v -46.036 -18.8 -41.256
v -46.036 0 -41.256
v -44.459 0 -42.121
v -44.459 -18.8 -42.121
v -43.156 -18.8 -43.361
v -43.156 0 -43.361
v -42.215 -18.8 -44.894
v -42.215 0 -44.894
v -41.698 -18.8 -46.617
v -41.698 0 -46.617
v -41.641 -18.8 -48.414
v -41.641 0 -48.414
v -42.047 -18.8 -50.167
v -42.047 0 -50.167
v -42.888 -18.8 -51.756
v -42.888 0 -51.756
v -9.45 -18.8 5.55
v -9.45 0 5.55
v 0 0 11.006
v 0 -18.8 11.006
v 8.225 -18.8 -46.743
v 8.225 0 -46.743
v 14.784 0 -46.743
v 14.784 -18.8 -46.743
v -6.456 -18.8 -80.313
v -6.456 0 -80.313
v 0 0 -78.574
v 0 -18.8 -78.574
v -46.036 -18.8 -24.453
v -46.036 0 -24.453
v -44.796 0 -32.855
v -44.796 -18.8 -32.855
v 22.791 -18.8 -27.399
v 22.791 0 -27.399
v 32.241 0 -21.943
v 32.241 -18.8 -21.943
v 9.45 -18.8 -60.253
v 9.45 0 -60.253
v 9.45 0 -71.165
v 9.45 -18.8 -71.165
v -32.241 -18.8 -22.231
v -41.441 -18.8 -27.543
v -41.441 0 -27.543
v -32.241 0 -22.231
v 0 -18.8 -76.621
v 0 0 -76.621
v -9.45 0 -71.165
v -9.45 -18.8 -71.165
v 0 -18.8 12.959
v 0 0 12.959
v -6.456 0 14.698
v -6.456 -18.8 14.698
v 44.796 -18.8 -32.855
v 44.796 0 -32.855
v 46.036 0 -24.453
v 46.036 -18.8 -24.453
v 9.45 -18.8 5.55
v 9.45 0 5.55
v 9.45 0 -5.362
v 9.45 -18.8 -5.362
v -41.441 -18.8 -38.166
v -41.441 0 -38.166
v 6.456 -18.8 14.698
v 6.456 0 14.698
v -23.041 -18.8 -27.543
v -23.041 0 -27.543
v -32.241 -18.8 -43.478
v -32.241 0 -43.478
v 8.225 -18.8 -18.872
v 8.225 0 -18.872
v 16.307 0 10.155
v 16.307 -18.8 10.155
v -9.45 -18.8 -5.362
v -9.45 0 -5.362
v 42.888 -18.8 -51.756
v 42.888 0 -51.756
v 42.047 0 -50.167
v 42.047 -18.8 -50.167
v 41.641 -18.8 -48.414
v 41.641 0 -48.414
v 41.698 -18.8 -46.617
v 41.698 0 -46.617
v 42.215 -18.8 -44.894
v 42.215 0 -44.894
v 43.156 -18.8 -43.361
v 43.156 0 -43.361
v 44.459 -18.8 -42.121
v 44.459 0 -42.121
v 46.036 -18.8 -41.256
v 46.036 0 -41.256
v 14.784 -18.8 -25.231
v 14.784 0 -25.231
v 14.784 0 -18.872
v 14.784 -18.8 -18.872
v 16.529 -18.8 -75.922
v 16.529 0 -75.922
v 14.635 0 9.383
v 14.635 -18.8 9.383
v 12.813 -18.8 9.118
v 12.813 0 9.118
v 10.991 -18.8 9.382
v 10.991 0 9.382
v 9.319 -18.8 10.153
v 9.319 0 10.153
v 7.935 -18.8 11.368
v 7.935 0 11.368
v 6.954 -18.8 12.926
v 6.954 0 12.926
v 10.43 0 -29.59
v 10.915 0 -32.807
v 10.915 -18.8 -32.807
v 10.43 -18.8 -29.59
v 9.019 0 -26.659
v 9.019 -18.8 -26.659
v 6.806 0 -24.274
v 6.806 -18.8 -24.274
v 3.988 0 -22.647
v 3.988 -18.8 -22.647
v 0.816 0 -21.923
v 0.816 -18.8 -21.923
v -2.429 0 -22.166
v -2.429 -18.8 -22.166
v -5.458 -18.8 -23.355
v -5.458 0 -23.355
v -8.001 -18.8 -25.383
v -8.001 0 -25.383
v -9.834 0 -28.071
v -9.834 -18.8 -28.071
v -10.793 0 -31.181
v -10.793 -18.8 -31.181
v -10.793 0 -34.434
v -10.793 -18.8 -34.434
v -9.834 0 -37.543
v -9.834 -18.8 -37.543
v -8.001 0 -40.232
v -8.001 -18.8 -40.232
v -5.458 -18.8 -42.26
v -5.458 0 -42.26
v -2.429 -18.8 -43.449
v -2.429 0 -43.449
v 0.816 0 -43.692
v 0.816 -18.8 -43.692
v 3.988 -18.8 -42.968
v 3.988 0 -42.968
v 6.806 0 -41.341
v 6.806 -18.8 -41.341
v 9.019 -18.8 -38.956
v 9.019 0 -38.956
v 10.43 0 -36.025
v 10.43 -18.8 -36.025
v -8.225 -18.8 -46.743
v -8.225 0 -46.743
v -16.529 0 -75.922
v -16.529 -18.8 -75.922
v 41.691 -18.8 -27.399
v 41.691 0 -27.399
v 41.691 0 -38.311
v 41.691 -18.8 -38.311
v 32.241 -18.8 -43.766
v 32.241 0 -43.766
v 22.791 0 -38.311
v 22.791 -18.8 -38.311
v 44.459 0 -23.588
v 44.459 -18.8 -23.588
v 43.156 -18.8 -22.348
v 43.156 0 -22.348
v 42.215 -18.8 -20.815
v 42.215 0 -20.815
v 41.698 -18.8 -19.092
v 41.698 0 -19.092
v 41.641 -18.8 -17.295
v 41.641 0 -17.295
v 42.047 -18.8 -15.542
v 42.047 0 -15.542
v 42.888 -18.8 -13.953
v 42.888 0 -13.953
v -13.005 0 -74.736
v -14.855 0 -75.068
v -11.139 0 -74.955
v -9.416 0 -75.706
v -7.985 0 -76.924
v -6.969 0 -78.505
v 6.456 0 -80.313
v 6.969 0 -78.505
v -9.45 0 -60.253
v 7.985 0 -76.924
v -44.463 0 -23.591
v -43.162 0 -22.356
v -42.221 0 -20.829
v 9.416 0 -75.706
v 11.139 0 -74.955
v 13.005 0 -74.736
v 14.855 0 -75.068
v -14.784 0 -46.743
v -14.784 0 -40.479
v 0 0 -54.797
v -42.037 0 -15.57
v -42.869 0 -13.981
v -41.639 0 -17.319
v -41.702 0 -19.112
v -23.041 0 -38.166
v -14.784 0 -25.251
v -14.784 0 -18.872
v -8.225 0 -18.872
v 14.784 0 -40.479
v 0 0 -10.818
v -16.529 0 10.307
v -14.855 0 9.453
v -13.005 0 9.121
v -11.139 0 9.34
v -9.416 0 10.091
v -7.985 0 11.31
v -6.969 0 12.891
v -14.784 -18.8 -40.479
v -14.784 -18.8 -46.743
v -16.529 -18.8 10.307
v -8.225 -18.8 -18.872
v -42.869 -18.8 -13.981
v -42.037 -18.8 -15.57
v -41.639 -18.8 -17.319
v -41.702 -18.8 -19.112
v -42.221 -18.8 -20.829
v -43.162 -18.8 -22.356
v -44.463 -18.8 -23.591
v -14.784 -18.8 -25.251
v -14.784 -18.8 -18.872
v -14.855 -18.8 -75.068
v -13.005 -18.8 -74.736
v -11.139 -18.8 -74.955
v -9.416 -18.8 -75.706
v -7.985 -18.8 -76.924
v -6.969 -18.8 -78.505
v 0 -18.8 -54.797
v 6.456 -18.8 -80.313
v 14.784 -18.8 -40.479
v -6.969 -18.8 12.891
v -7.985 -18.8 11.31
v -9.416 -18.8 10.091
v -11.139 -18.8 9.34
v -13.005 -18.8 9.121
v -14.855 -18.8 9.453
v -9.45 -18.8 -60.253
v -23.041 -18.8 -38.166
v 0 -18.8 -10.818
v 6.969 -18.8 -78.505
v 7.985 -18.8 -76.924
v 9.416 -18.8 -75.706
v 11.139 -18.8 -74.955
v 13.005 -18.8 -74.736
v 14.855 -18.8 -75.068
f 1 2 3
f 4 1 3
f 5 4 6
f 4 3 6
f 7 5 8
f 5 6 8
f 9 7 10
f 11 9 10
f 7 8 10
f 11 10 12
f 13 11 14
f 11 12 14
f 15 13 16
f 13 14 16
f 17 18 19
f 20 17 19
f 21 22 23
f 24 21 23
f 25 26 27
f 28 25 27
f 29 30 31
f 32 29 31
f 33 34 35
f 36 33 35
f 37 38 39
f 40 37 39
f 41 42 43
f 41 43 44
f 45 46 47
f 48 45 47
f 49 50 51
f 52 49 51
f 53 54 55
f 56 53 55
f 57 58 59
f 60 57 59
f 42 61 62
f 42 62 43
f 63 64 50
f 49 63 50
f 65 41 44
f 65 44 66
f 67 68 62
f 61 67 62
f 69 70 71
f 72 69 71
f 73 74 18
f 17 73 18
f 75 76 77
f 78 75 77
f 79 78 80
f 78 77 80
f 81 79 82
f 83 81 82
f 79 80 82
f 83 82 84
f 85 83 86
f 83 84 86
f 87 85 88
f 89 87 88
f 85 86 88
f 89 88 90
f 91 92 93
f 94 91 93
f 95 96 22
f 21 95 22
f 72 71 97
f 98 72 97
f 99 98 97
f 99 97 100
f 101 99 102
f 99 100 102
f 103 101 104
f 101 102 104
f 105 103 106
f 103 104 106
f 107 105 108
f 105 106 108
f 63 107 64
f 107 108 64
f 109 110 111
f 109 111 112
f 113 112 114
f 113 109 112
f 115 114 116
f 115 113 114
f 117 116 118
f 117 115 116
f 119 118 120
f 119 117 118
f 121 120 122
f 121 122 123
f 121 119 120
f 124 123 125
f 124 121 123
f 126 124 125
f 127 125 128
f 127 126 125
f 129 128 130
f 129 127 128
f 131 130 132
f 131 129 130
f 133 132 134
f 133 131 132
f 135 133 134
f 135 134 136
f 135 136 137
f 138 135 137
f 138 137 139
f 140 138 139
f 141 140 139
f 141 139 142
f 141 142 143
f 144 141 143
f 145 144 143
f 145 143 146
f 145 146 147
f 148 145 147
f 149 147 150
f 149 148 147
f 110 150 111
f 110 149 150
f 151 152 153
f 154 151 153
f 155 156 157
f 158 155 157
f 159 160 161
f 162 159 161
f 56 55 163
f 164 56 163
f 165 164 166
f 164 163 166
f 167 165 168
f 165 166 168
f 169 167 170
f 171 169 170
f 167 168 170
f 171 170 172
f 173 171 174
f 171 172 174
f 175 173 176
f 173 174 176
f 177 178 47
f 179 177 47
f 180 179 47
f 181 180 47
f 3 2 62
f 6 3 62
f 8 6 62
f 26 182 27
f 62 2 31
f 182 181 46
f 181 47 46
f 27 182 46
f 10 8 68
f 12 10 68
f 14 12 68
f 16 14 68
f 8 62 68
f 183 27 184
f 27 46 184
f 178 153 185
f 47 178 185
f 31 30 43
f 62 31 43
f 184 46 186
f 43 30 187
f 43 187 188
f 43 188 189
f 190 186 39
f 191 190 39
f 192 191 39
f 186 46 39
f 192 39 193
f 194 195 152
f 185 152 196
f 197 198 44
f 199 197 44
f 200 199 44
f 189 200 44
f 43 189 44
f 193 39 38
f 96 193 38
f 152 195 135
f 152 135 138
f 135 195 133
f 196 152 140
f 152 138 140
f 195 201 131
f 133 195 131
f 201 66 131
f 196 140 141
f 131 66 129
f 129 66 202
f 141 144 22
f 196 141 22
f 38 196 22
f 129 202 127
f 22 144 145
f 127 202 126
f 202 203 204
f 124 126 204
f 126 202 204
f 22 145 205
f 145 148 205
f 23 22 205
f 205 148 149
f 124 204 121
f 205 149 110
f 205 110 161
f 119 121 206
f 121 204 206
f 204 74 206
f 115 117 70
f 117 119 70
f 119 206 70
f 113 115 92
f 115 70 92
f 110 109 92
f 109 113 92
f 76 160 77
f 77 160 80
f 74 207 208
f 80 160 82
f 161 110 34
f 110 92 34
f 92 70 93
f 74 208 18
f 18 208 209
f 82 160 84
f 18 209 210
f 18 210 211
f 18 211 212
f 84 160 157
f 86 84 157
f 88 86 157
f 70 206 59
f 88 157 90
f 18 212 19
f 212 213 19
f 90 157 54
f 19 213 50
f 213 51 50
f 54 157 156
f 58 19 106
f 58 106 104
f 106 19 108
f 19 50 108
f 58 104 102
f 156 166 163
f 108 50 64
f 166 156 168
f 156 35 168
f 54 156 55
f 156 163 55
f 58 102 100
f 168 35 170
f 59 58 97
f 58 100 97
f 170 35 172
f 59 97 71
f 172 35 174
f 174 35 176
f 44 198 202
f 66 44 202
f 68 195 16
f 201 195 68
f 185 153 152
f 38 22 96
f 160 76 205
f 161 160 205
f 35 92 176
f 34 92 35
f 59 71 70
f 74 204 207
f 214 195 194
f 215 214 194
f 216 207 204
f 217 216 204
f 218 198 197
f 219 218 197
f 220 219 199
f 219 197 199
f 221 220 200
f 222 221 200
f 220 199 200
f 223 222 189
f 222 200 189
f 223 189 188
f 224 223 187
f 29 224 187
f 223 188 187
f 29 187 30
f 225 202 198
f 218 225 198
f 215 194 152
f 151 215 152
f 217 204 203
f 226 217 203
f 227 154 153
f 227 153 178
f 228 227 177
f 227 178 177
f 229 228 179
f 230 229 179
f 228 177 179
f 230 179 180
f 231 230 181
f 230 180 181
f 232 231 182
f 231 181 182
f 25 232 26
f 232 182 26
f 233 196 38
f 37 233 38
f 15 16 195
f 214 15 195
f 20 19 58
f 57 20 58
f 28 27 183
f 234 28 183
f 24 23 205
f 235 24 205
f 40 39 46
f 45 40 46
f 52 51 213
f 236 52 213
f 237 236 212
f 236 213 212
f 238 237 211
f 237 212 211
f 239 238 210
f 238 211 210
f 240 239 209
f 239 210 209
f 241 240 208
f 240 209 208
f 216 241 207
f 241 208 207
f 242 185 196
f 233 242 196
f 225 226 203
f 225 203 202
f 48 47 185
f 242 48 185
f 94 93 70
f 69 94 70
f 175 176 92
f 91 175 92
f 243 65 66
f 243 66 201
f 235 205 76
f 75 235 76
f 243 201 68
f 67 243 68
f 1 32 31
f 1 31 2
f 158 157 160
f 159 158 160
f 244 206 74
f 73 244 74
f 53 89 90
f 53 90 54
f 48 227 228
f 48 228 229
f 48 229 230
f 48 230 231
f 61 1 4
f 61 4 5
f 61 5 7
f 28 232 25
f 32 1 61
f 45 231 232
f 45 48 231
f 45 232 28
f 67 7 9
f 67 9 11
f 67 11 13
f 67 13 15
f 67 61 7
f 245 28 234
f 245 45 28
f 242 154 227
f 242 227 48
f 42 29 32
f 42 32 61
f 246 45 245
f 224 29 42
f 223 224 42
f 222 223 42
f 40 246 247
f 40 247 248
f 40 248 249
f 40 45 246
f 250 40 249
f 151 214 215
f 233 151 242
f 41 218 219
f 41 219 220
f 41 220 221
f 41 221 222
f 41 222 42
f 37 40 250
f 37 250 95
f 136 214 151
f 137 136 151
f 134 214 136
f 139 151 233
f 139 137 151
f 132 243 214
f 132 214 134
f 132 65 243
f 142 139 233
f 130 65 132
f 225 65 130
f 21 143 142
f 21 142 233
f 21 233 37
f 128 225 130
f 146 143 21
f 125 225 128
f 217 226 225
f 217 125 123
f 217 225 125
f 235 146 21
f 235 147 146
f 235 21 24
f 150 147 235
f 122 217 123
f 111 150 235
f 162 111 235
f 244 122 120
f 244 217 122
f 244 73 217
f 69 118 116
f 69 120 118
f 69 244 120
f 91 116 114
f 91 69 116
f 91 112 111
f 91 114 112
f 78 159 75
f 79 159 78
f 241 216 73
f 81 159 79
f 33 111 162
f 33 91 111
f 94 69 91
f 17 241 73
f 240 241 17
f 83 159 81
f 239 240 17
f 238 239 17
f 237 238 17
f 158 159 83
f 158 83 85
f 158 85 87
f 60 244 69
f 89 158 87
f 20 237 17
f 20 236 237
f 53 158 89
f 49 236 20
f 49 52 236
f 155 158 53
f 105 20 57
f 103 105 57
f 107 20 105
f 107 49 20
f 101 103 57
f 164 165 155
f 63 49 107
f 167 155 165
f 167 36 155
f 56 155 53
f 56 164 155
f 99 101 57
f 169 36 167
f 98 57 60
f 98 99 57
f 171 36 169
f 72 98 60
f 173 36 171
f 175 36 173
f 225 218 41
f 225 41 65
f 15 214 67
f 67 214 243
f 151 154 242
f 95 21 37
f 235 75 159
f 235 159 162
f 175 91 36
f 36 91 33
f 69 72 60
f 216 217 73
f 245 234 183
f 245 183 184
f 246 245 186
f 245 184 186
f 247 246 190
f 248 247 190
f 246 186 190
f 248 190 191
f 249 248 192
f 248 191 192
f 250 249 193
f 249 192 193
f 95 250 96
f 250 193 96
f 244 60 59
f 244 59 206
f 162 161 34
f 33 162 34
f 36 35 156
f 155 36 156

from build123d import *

# Parameters (mm, degrees)
F0_R     = 10.915306
F1_DEPTH = 18.8


with BuildPart() as f1:
    # F0 (on Front) → F1 (new body)
    with BuildSketch(Plane.XZ):
        Polygon((-8.224501, -18.871788), (-14.783561, -18.871788), (-14.783561, -25.250662), (-14.783561, -40.478557), (-14.783561, -46.743103), (-8.224501, -46.743103), (8.224501, -46.743103), (14.783561, -46.743103), (14.783561, -40.478557), (14.783561, -25.230598), (14.783561, -18.871788), (8.224771, -18.871788), align=None)
        with Locations((0, -32.807445)):
            Circle(F0_R, mode=Mode.SUBTRACT)
        with BuildLine():
            Line((-16.529163, 10.306755), (-8.224501, -18.871788))
            Line((-8.224501, -18.871788), (8.224771, -18.871788))
            Line((8.224771, -18.871788), (16.306807, 10.15533))
            ThreePointArc((16.306807, 10.15533), (10.12712, 9.707231), (6.4558, 14.698296))
            Line((6.4558, 14.698296), (0, 12.95887))
            Line((0, 12.95887), (-6.4558, 14.698296))
            ThreePointArc((-6.4558, 14.698296), (-10.249858, 9.652182), (-16.529163, 10.306755))
        make_face()
        Polygon((9.45, -5.361695), (0, -10.817656), (-9.45, -5.361695), (-9.45, 5.550225), (0, 11.006185), (9.45, 5.550225), align=None, mode=Mode.SUBTRACT)
        with BuildLine():
            Line((-14.783561, -40.478557), (-14.783561, -25.250662))
            Line((-14.783561, -25.250662), (-42.868647, -13.980851))
            ThreePointArc((-42.868647, -13.980851), (-41.905671, -19.987009), (-46.035767, -24.452832))
            Line((-46.035767, -24.452832), (-44.79609, -32.854578))
            Line((-44.79609, -32.854578), (-46.035767, -41.256323))
            ThreePointArc((-46.035767, -41.256323), (-41.900736, -45.738537), (-42.888374, -51.756284))
            Line((-42.888374, -51.756284), (-14.783561, -40.478557))
        make_face()
        Polygon((-32.240685, -43.477823), (-41.440685, -38.1662), (-41.440685, -27.542955), (-32.240685, -22.231333), (-23.040685, -27.542955), (-23.040685, -38.1662), align=None, mode=Mode.SUBTRACT)
        with BuildLine():
            Line((42.888374, -13.952871), (14.783561, -25.230598))
            Line((14.783561, -25.230598), (14.783561, -40.478557))
            Line((14.783561, -40.478557), (42.888374, -51.756284))
            ThreePointArc((42.888374, -51.756284), (41.900736, -45.738537), (46.035767, -41.256323))
            Line((46.035767, -41.256323), (44.79609, -32.854578))
            Line((44.79609, -32.854578), (46.035767, -24.452832))
            ThreePointArc((46.035767, -24.452832), (41.900736, -19.970619), (42.888374, -13.952871))
        make_face()
        Polygon((32.240685, -43.766498), (22.790685, -38.310538), (22.790685, -27.398618), (32.240685, -21.942658), (41.690685, -27.398618), (41.690685, -38.310538), align=None, mode=Mode.SUBTRACT)
        with BuildLine():
            Line((8.224501, -46.743103), (-8.224501, -46.743103))
            Line((-8.224501, -46.743103), (-16.529163, -75.921646))
            ThreePointArc((-16.529163, -75.921646), (-10.249858, -75.267073), (-6.4558, -80.313187))
            Line((-6.4558, -80.313187), (0, -78.573761))
            Line((0, -78.573761), (6.4558, -80.313187))
            ThreePointArc((6.4558, -80.313187), (10.249858, -75.267073), (16.529163, -75.921646))
            Line((16.529163, -75.921646), (8.224501, -46.743103))
        make_face()
        Polygon((-9.45, -71.165115), (-9.45, -60.253195), (0, -54.797235), (9.45, -60.253195), (9.45, -71.165115), (0, -76.621075), align=None, mode=Mode.SUBTRACT)
    extrude(amount=F1_DEPTH)


solid = f1.part
